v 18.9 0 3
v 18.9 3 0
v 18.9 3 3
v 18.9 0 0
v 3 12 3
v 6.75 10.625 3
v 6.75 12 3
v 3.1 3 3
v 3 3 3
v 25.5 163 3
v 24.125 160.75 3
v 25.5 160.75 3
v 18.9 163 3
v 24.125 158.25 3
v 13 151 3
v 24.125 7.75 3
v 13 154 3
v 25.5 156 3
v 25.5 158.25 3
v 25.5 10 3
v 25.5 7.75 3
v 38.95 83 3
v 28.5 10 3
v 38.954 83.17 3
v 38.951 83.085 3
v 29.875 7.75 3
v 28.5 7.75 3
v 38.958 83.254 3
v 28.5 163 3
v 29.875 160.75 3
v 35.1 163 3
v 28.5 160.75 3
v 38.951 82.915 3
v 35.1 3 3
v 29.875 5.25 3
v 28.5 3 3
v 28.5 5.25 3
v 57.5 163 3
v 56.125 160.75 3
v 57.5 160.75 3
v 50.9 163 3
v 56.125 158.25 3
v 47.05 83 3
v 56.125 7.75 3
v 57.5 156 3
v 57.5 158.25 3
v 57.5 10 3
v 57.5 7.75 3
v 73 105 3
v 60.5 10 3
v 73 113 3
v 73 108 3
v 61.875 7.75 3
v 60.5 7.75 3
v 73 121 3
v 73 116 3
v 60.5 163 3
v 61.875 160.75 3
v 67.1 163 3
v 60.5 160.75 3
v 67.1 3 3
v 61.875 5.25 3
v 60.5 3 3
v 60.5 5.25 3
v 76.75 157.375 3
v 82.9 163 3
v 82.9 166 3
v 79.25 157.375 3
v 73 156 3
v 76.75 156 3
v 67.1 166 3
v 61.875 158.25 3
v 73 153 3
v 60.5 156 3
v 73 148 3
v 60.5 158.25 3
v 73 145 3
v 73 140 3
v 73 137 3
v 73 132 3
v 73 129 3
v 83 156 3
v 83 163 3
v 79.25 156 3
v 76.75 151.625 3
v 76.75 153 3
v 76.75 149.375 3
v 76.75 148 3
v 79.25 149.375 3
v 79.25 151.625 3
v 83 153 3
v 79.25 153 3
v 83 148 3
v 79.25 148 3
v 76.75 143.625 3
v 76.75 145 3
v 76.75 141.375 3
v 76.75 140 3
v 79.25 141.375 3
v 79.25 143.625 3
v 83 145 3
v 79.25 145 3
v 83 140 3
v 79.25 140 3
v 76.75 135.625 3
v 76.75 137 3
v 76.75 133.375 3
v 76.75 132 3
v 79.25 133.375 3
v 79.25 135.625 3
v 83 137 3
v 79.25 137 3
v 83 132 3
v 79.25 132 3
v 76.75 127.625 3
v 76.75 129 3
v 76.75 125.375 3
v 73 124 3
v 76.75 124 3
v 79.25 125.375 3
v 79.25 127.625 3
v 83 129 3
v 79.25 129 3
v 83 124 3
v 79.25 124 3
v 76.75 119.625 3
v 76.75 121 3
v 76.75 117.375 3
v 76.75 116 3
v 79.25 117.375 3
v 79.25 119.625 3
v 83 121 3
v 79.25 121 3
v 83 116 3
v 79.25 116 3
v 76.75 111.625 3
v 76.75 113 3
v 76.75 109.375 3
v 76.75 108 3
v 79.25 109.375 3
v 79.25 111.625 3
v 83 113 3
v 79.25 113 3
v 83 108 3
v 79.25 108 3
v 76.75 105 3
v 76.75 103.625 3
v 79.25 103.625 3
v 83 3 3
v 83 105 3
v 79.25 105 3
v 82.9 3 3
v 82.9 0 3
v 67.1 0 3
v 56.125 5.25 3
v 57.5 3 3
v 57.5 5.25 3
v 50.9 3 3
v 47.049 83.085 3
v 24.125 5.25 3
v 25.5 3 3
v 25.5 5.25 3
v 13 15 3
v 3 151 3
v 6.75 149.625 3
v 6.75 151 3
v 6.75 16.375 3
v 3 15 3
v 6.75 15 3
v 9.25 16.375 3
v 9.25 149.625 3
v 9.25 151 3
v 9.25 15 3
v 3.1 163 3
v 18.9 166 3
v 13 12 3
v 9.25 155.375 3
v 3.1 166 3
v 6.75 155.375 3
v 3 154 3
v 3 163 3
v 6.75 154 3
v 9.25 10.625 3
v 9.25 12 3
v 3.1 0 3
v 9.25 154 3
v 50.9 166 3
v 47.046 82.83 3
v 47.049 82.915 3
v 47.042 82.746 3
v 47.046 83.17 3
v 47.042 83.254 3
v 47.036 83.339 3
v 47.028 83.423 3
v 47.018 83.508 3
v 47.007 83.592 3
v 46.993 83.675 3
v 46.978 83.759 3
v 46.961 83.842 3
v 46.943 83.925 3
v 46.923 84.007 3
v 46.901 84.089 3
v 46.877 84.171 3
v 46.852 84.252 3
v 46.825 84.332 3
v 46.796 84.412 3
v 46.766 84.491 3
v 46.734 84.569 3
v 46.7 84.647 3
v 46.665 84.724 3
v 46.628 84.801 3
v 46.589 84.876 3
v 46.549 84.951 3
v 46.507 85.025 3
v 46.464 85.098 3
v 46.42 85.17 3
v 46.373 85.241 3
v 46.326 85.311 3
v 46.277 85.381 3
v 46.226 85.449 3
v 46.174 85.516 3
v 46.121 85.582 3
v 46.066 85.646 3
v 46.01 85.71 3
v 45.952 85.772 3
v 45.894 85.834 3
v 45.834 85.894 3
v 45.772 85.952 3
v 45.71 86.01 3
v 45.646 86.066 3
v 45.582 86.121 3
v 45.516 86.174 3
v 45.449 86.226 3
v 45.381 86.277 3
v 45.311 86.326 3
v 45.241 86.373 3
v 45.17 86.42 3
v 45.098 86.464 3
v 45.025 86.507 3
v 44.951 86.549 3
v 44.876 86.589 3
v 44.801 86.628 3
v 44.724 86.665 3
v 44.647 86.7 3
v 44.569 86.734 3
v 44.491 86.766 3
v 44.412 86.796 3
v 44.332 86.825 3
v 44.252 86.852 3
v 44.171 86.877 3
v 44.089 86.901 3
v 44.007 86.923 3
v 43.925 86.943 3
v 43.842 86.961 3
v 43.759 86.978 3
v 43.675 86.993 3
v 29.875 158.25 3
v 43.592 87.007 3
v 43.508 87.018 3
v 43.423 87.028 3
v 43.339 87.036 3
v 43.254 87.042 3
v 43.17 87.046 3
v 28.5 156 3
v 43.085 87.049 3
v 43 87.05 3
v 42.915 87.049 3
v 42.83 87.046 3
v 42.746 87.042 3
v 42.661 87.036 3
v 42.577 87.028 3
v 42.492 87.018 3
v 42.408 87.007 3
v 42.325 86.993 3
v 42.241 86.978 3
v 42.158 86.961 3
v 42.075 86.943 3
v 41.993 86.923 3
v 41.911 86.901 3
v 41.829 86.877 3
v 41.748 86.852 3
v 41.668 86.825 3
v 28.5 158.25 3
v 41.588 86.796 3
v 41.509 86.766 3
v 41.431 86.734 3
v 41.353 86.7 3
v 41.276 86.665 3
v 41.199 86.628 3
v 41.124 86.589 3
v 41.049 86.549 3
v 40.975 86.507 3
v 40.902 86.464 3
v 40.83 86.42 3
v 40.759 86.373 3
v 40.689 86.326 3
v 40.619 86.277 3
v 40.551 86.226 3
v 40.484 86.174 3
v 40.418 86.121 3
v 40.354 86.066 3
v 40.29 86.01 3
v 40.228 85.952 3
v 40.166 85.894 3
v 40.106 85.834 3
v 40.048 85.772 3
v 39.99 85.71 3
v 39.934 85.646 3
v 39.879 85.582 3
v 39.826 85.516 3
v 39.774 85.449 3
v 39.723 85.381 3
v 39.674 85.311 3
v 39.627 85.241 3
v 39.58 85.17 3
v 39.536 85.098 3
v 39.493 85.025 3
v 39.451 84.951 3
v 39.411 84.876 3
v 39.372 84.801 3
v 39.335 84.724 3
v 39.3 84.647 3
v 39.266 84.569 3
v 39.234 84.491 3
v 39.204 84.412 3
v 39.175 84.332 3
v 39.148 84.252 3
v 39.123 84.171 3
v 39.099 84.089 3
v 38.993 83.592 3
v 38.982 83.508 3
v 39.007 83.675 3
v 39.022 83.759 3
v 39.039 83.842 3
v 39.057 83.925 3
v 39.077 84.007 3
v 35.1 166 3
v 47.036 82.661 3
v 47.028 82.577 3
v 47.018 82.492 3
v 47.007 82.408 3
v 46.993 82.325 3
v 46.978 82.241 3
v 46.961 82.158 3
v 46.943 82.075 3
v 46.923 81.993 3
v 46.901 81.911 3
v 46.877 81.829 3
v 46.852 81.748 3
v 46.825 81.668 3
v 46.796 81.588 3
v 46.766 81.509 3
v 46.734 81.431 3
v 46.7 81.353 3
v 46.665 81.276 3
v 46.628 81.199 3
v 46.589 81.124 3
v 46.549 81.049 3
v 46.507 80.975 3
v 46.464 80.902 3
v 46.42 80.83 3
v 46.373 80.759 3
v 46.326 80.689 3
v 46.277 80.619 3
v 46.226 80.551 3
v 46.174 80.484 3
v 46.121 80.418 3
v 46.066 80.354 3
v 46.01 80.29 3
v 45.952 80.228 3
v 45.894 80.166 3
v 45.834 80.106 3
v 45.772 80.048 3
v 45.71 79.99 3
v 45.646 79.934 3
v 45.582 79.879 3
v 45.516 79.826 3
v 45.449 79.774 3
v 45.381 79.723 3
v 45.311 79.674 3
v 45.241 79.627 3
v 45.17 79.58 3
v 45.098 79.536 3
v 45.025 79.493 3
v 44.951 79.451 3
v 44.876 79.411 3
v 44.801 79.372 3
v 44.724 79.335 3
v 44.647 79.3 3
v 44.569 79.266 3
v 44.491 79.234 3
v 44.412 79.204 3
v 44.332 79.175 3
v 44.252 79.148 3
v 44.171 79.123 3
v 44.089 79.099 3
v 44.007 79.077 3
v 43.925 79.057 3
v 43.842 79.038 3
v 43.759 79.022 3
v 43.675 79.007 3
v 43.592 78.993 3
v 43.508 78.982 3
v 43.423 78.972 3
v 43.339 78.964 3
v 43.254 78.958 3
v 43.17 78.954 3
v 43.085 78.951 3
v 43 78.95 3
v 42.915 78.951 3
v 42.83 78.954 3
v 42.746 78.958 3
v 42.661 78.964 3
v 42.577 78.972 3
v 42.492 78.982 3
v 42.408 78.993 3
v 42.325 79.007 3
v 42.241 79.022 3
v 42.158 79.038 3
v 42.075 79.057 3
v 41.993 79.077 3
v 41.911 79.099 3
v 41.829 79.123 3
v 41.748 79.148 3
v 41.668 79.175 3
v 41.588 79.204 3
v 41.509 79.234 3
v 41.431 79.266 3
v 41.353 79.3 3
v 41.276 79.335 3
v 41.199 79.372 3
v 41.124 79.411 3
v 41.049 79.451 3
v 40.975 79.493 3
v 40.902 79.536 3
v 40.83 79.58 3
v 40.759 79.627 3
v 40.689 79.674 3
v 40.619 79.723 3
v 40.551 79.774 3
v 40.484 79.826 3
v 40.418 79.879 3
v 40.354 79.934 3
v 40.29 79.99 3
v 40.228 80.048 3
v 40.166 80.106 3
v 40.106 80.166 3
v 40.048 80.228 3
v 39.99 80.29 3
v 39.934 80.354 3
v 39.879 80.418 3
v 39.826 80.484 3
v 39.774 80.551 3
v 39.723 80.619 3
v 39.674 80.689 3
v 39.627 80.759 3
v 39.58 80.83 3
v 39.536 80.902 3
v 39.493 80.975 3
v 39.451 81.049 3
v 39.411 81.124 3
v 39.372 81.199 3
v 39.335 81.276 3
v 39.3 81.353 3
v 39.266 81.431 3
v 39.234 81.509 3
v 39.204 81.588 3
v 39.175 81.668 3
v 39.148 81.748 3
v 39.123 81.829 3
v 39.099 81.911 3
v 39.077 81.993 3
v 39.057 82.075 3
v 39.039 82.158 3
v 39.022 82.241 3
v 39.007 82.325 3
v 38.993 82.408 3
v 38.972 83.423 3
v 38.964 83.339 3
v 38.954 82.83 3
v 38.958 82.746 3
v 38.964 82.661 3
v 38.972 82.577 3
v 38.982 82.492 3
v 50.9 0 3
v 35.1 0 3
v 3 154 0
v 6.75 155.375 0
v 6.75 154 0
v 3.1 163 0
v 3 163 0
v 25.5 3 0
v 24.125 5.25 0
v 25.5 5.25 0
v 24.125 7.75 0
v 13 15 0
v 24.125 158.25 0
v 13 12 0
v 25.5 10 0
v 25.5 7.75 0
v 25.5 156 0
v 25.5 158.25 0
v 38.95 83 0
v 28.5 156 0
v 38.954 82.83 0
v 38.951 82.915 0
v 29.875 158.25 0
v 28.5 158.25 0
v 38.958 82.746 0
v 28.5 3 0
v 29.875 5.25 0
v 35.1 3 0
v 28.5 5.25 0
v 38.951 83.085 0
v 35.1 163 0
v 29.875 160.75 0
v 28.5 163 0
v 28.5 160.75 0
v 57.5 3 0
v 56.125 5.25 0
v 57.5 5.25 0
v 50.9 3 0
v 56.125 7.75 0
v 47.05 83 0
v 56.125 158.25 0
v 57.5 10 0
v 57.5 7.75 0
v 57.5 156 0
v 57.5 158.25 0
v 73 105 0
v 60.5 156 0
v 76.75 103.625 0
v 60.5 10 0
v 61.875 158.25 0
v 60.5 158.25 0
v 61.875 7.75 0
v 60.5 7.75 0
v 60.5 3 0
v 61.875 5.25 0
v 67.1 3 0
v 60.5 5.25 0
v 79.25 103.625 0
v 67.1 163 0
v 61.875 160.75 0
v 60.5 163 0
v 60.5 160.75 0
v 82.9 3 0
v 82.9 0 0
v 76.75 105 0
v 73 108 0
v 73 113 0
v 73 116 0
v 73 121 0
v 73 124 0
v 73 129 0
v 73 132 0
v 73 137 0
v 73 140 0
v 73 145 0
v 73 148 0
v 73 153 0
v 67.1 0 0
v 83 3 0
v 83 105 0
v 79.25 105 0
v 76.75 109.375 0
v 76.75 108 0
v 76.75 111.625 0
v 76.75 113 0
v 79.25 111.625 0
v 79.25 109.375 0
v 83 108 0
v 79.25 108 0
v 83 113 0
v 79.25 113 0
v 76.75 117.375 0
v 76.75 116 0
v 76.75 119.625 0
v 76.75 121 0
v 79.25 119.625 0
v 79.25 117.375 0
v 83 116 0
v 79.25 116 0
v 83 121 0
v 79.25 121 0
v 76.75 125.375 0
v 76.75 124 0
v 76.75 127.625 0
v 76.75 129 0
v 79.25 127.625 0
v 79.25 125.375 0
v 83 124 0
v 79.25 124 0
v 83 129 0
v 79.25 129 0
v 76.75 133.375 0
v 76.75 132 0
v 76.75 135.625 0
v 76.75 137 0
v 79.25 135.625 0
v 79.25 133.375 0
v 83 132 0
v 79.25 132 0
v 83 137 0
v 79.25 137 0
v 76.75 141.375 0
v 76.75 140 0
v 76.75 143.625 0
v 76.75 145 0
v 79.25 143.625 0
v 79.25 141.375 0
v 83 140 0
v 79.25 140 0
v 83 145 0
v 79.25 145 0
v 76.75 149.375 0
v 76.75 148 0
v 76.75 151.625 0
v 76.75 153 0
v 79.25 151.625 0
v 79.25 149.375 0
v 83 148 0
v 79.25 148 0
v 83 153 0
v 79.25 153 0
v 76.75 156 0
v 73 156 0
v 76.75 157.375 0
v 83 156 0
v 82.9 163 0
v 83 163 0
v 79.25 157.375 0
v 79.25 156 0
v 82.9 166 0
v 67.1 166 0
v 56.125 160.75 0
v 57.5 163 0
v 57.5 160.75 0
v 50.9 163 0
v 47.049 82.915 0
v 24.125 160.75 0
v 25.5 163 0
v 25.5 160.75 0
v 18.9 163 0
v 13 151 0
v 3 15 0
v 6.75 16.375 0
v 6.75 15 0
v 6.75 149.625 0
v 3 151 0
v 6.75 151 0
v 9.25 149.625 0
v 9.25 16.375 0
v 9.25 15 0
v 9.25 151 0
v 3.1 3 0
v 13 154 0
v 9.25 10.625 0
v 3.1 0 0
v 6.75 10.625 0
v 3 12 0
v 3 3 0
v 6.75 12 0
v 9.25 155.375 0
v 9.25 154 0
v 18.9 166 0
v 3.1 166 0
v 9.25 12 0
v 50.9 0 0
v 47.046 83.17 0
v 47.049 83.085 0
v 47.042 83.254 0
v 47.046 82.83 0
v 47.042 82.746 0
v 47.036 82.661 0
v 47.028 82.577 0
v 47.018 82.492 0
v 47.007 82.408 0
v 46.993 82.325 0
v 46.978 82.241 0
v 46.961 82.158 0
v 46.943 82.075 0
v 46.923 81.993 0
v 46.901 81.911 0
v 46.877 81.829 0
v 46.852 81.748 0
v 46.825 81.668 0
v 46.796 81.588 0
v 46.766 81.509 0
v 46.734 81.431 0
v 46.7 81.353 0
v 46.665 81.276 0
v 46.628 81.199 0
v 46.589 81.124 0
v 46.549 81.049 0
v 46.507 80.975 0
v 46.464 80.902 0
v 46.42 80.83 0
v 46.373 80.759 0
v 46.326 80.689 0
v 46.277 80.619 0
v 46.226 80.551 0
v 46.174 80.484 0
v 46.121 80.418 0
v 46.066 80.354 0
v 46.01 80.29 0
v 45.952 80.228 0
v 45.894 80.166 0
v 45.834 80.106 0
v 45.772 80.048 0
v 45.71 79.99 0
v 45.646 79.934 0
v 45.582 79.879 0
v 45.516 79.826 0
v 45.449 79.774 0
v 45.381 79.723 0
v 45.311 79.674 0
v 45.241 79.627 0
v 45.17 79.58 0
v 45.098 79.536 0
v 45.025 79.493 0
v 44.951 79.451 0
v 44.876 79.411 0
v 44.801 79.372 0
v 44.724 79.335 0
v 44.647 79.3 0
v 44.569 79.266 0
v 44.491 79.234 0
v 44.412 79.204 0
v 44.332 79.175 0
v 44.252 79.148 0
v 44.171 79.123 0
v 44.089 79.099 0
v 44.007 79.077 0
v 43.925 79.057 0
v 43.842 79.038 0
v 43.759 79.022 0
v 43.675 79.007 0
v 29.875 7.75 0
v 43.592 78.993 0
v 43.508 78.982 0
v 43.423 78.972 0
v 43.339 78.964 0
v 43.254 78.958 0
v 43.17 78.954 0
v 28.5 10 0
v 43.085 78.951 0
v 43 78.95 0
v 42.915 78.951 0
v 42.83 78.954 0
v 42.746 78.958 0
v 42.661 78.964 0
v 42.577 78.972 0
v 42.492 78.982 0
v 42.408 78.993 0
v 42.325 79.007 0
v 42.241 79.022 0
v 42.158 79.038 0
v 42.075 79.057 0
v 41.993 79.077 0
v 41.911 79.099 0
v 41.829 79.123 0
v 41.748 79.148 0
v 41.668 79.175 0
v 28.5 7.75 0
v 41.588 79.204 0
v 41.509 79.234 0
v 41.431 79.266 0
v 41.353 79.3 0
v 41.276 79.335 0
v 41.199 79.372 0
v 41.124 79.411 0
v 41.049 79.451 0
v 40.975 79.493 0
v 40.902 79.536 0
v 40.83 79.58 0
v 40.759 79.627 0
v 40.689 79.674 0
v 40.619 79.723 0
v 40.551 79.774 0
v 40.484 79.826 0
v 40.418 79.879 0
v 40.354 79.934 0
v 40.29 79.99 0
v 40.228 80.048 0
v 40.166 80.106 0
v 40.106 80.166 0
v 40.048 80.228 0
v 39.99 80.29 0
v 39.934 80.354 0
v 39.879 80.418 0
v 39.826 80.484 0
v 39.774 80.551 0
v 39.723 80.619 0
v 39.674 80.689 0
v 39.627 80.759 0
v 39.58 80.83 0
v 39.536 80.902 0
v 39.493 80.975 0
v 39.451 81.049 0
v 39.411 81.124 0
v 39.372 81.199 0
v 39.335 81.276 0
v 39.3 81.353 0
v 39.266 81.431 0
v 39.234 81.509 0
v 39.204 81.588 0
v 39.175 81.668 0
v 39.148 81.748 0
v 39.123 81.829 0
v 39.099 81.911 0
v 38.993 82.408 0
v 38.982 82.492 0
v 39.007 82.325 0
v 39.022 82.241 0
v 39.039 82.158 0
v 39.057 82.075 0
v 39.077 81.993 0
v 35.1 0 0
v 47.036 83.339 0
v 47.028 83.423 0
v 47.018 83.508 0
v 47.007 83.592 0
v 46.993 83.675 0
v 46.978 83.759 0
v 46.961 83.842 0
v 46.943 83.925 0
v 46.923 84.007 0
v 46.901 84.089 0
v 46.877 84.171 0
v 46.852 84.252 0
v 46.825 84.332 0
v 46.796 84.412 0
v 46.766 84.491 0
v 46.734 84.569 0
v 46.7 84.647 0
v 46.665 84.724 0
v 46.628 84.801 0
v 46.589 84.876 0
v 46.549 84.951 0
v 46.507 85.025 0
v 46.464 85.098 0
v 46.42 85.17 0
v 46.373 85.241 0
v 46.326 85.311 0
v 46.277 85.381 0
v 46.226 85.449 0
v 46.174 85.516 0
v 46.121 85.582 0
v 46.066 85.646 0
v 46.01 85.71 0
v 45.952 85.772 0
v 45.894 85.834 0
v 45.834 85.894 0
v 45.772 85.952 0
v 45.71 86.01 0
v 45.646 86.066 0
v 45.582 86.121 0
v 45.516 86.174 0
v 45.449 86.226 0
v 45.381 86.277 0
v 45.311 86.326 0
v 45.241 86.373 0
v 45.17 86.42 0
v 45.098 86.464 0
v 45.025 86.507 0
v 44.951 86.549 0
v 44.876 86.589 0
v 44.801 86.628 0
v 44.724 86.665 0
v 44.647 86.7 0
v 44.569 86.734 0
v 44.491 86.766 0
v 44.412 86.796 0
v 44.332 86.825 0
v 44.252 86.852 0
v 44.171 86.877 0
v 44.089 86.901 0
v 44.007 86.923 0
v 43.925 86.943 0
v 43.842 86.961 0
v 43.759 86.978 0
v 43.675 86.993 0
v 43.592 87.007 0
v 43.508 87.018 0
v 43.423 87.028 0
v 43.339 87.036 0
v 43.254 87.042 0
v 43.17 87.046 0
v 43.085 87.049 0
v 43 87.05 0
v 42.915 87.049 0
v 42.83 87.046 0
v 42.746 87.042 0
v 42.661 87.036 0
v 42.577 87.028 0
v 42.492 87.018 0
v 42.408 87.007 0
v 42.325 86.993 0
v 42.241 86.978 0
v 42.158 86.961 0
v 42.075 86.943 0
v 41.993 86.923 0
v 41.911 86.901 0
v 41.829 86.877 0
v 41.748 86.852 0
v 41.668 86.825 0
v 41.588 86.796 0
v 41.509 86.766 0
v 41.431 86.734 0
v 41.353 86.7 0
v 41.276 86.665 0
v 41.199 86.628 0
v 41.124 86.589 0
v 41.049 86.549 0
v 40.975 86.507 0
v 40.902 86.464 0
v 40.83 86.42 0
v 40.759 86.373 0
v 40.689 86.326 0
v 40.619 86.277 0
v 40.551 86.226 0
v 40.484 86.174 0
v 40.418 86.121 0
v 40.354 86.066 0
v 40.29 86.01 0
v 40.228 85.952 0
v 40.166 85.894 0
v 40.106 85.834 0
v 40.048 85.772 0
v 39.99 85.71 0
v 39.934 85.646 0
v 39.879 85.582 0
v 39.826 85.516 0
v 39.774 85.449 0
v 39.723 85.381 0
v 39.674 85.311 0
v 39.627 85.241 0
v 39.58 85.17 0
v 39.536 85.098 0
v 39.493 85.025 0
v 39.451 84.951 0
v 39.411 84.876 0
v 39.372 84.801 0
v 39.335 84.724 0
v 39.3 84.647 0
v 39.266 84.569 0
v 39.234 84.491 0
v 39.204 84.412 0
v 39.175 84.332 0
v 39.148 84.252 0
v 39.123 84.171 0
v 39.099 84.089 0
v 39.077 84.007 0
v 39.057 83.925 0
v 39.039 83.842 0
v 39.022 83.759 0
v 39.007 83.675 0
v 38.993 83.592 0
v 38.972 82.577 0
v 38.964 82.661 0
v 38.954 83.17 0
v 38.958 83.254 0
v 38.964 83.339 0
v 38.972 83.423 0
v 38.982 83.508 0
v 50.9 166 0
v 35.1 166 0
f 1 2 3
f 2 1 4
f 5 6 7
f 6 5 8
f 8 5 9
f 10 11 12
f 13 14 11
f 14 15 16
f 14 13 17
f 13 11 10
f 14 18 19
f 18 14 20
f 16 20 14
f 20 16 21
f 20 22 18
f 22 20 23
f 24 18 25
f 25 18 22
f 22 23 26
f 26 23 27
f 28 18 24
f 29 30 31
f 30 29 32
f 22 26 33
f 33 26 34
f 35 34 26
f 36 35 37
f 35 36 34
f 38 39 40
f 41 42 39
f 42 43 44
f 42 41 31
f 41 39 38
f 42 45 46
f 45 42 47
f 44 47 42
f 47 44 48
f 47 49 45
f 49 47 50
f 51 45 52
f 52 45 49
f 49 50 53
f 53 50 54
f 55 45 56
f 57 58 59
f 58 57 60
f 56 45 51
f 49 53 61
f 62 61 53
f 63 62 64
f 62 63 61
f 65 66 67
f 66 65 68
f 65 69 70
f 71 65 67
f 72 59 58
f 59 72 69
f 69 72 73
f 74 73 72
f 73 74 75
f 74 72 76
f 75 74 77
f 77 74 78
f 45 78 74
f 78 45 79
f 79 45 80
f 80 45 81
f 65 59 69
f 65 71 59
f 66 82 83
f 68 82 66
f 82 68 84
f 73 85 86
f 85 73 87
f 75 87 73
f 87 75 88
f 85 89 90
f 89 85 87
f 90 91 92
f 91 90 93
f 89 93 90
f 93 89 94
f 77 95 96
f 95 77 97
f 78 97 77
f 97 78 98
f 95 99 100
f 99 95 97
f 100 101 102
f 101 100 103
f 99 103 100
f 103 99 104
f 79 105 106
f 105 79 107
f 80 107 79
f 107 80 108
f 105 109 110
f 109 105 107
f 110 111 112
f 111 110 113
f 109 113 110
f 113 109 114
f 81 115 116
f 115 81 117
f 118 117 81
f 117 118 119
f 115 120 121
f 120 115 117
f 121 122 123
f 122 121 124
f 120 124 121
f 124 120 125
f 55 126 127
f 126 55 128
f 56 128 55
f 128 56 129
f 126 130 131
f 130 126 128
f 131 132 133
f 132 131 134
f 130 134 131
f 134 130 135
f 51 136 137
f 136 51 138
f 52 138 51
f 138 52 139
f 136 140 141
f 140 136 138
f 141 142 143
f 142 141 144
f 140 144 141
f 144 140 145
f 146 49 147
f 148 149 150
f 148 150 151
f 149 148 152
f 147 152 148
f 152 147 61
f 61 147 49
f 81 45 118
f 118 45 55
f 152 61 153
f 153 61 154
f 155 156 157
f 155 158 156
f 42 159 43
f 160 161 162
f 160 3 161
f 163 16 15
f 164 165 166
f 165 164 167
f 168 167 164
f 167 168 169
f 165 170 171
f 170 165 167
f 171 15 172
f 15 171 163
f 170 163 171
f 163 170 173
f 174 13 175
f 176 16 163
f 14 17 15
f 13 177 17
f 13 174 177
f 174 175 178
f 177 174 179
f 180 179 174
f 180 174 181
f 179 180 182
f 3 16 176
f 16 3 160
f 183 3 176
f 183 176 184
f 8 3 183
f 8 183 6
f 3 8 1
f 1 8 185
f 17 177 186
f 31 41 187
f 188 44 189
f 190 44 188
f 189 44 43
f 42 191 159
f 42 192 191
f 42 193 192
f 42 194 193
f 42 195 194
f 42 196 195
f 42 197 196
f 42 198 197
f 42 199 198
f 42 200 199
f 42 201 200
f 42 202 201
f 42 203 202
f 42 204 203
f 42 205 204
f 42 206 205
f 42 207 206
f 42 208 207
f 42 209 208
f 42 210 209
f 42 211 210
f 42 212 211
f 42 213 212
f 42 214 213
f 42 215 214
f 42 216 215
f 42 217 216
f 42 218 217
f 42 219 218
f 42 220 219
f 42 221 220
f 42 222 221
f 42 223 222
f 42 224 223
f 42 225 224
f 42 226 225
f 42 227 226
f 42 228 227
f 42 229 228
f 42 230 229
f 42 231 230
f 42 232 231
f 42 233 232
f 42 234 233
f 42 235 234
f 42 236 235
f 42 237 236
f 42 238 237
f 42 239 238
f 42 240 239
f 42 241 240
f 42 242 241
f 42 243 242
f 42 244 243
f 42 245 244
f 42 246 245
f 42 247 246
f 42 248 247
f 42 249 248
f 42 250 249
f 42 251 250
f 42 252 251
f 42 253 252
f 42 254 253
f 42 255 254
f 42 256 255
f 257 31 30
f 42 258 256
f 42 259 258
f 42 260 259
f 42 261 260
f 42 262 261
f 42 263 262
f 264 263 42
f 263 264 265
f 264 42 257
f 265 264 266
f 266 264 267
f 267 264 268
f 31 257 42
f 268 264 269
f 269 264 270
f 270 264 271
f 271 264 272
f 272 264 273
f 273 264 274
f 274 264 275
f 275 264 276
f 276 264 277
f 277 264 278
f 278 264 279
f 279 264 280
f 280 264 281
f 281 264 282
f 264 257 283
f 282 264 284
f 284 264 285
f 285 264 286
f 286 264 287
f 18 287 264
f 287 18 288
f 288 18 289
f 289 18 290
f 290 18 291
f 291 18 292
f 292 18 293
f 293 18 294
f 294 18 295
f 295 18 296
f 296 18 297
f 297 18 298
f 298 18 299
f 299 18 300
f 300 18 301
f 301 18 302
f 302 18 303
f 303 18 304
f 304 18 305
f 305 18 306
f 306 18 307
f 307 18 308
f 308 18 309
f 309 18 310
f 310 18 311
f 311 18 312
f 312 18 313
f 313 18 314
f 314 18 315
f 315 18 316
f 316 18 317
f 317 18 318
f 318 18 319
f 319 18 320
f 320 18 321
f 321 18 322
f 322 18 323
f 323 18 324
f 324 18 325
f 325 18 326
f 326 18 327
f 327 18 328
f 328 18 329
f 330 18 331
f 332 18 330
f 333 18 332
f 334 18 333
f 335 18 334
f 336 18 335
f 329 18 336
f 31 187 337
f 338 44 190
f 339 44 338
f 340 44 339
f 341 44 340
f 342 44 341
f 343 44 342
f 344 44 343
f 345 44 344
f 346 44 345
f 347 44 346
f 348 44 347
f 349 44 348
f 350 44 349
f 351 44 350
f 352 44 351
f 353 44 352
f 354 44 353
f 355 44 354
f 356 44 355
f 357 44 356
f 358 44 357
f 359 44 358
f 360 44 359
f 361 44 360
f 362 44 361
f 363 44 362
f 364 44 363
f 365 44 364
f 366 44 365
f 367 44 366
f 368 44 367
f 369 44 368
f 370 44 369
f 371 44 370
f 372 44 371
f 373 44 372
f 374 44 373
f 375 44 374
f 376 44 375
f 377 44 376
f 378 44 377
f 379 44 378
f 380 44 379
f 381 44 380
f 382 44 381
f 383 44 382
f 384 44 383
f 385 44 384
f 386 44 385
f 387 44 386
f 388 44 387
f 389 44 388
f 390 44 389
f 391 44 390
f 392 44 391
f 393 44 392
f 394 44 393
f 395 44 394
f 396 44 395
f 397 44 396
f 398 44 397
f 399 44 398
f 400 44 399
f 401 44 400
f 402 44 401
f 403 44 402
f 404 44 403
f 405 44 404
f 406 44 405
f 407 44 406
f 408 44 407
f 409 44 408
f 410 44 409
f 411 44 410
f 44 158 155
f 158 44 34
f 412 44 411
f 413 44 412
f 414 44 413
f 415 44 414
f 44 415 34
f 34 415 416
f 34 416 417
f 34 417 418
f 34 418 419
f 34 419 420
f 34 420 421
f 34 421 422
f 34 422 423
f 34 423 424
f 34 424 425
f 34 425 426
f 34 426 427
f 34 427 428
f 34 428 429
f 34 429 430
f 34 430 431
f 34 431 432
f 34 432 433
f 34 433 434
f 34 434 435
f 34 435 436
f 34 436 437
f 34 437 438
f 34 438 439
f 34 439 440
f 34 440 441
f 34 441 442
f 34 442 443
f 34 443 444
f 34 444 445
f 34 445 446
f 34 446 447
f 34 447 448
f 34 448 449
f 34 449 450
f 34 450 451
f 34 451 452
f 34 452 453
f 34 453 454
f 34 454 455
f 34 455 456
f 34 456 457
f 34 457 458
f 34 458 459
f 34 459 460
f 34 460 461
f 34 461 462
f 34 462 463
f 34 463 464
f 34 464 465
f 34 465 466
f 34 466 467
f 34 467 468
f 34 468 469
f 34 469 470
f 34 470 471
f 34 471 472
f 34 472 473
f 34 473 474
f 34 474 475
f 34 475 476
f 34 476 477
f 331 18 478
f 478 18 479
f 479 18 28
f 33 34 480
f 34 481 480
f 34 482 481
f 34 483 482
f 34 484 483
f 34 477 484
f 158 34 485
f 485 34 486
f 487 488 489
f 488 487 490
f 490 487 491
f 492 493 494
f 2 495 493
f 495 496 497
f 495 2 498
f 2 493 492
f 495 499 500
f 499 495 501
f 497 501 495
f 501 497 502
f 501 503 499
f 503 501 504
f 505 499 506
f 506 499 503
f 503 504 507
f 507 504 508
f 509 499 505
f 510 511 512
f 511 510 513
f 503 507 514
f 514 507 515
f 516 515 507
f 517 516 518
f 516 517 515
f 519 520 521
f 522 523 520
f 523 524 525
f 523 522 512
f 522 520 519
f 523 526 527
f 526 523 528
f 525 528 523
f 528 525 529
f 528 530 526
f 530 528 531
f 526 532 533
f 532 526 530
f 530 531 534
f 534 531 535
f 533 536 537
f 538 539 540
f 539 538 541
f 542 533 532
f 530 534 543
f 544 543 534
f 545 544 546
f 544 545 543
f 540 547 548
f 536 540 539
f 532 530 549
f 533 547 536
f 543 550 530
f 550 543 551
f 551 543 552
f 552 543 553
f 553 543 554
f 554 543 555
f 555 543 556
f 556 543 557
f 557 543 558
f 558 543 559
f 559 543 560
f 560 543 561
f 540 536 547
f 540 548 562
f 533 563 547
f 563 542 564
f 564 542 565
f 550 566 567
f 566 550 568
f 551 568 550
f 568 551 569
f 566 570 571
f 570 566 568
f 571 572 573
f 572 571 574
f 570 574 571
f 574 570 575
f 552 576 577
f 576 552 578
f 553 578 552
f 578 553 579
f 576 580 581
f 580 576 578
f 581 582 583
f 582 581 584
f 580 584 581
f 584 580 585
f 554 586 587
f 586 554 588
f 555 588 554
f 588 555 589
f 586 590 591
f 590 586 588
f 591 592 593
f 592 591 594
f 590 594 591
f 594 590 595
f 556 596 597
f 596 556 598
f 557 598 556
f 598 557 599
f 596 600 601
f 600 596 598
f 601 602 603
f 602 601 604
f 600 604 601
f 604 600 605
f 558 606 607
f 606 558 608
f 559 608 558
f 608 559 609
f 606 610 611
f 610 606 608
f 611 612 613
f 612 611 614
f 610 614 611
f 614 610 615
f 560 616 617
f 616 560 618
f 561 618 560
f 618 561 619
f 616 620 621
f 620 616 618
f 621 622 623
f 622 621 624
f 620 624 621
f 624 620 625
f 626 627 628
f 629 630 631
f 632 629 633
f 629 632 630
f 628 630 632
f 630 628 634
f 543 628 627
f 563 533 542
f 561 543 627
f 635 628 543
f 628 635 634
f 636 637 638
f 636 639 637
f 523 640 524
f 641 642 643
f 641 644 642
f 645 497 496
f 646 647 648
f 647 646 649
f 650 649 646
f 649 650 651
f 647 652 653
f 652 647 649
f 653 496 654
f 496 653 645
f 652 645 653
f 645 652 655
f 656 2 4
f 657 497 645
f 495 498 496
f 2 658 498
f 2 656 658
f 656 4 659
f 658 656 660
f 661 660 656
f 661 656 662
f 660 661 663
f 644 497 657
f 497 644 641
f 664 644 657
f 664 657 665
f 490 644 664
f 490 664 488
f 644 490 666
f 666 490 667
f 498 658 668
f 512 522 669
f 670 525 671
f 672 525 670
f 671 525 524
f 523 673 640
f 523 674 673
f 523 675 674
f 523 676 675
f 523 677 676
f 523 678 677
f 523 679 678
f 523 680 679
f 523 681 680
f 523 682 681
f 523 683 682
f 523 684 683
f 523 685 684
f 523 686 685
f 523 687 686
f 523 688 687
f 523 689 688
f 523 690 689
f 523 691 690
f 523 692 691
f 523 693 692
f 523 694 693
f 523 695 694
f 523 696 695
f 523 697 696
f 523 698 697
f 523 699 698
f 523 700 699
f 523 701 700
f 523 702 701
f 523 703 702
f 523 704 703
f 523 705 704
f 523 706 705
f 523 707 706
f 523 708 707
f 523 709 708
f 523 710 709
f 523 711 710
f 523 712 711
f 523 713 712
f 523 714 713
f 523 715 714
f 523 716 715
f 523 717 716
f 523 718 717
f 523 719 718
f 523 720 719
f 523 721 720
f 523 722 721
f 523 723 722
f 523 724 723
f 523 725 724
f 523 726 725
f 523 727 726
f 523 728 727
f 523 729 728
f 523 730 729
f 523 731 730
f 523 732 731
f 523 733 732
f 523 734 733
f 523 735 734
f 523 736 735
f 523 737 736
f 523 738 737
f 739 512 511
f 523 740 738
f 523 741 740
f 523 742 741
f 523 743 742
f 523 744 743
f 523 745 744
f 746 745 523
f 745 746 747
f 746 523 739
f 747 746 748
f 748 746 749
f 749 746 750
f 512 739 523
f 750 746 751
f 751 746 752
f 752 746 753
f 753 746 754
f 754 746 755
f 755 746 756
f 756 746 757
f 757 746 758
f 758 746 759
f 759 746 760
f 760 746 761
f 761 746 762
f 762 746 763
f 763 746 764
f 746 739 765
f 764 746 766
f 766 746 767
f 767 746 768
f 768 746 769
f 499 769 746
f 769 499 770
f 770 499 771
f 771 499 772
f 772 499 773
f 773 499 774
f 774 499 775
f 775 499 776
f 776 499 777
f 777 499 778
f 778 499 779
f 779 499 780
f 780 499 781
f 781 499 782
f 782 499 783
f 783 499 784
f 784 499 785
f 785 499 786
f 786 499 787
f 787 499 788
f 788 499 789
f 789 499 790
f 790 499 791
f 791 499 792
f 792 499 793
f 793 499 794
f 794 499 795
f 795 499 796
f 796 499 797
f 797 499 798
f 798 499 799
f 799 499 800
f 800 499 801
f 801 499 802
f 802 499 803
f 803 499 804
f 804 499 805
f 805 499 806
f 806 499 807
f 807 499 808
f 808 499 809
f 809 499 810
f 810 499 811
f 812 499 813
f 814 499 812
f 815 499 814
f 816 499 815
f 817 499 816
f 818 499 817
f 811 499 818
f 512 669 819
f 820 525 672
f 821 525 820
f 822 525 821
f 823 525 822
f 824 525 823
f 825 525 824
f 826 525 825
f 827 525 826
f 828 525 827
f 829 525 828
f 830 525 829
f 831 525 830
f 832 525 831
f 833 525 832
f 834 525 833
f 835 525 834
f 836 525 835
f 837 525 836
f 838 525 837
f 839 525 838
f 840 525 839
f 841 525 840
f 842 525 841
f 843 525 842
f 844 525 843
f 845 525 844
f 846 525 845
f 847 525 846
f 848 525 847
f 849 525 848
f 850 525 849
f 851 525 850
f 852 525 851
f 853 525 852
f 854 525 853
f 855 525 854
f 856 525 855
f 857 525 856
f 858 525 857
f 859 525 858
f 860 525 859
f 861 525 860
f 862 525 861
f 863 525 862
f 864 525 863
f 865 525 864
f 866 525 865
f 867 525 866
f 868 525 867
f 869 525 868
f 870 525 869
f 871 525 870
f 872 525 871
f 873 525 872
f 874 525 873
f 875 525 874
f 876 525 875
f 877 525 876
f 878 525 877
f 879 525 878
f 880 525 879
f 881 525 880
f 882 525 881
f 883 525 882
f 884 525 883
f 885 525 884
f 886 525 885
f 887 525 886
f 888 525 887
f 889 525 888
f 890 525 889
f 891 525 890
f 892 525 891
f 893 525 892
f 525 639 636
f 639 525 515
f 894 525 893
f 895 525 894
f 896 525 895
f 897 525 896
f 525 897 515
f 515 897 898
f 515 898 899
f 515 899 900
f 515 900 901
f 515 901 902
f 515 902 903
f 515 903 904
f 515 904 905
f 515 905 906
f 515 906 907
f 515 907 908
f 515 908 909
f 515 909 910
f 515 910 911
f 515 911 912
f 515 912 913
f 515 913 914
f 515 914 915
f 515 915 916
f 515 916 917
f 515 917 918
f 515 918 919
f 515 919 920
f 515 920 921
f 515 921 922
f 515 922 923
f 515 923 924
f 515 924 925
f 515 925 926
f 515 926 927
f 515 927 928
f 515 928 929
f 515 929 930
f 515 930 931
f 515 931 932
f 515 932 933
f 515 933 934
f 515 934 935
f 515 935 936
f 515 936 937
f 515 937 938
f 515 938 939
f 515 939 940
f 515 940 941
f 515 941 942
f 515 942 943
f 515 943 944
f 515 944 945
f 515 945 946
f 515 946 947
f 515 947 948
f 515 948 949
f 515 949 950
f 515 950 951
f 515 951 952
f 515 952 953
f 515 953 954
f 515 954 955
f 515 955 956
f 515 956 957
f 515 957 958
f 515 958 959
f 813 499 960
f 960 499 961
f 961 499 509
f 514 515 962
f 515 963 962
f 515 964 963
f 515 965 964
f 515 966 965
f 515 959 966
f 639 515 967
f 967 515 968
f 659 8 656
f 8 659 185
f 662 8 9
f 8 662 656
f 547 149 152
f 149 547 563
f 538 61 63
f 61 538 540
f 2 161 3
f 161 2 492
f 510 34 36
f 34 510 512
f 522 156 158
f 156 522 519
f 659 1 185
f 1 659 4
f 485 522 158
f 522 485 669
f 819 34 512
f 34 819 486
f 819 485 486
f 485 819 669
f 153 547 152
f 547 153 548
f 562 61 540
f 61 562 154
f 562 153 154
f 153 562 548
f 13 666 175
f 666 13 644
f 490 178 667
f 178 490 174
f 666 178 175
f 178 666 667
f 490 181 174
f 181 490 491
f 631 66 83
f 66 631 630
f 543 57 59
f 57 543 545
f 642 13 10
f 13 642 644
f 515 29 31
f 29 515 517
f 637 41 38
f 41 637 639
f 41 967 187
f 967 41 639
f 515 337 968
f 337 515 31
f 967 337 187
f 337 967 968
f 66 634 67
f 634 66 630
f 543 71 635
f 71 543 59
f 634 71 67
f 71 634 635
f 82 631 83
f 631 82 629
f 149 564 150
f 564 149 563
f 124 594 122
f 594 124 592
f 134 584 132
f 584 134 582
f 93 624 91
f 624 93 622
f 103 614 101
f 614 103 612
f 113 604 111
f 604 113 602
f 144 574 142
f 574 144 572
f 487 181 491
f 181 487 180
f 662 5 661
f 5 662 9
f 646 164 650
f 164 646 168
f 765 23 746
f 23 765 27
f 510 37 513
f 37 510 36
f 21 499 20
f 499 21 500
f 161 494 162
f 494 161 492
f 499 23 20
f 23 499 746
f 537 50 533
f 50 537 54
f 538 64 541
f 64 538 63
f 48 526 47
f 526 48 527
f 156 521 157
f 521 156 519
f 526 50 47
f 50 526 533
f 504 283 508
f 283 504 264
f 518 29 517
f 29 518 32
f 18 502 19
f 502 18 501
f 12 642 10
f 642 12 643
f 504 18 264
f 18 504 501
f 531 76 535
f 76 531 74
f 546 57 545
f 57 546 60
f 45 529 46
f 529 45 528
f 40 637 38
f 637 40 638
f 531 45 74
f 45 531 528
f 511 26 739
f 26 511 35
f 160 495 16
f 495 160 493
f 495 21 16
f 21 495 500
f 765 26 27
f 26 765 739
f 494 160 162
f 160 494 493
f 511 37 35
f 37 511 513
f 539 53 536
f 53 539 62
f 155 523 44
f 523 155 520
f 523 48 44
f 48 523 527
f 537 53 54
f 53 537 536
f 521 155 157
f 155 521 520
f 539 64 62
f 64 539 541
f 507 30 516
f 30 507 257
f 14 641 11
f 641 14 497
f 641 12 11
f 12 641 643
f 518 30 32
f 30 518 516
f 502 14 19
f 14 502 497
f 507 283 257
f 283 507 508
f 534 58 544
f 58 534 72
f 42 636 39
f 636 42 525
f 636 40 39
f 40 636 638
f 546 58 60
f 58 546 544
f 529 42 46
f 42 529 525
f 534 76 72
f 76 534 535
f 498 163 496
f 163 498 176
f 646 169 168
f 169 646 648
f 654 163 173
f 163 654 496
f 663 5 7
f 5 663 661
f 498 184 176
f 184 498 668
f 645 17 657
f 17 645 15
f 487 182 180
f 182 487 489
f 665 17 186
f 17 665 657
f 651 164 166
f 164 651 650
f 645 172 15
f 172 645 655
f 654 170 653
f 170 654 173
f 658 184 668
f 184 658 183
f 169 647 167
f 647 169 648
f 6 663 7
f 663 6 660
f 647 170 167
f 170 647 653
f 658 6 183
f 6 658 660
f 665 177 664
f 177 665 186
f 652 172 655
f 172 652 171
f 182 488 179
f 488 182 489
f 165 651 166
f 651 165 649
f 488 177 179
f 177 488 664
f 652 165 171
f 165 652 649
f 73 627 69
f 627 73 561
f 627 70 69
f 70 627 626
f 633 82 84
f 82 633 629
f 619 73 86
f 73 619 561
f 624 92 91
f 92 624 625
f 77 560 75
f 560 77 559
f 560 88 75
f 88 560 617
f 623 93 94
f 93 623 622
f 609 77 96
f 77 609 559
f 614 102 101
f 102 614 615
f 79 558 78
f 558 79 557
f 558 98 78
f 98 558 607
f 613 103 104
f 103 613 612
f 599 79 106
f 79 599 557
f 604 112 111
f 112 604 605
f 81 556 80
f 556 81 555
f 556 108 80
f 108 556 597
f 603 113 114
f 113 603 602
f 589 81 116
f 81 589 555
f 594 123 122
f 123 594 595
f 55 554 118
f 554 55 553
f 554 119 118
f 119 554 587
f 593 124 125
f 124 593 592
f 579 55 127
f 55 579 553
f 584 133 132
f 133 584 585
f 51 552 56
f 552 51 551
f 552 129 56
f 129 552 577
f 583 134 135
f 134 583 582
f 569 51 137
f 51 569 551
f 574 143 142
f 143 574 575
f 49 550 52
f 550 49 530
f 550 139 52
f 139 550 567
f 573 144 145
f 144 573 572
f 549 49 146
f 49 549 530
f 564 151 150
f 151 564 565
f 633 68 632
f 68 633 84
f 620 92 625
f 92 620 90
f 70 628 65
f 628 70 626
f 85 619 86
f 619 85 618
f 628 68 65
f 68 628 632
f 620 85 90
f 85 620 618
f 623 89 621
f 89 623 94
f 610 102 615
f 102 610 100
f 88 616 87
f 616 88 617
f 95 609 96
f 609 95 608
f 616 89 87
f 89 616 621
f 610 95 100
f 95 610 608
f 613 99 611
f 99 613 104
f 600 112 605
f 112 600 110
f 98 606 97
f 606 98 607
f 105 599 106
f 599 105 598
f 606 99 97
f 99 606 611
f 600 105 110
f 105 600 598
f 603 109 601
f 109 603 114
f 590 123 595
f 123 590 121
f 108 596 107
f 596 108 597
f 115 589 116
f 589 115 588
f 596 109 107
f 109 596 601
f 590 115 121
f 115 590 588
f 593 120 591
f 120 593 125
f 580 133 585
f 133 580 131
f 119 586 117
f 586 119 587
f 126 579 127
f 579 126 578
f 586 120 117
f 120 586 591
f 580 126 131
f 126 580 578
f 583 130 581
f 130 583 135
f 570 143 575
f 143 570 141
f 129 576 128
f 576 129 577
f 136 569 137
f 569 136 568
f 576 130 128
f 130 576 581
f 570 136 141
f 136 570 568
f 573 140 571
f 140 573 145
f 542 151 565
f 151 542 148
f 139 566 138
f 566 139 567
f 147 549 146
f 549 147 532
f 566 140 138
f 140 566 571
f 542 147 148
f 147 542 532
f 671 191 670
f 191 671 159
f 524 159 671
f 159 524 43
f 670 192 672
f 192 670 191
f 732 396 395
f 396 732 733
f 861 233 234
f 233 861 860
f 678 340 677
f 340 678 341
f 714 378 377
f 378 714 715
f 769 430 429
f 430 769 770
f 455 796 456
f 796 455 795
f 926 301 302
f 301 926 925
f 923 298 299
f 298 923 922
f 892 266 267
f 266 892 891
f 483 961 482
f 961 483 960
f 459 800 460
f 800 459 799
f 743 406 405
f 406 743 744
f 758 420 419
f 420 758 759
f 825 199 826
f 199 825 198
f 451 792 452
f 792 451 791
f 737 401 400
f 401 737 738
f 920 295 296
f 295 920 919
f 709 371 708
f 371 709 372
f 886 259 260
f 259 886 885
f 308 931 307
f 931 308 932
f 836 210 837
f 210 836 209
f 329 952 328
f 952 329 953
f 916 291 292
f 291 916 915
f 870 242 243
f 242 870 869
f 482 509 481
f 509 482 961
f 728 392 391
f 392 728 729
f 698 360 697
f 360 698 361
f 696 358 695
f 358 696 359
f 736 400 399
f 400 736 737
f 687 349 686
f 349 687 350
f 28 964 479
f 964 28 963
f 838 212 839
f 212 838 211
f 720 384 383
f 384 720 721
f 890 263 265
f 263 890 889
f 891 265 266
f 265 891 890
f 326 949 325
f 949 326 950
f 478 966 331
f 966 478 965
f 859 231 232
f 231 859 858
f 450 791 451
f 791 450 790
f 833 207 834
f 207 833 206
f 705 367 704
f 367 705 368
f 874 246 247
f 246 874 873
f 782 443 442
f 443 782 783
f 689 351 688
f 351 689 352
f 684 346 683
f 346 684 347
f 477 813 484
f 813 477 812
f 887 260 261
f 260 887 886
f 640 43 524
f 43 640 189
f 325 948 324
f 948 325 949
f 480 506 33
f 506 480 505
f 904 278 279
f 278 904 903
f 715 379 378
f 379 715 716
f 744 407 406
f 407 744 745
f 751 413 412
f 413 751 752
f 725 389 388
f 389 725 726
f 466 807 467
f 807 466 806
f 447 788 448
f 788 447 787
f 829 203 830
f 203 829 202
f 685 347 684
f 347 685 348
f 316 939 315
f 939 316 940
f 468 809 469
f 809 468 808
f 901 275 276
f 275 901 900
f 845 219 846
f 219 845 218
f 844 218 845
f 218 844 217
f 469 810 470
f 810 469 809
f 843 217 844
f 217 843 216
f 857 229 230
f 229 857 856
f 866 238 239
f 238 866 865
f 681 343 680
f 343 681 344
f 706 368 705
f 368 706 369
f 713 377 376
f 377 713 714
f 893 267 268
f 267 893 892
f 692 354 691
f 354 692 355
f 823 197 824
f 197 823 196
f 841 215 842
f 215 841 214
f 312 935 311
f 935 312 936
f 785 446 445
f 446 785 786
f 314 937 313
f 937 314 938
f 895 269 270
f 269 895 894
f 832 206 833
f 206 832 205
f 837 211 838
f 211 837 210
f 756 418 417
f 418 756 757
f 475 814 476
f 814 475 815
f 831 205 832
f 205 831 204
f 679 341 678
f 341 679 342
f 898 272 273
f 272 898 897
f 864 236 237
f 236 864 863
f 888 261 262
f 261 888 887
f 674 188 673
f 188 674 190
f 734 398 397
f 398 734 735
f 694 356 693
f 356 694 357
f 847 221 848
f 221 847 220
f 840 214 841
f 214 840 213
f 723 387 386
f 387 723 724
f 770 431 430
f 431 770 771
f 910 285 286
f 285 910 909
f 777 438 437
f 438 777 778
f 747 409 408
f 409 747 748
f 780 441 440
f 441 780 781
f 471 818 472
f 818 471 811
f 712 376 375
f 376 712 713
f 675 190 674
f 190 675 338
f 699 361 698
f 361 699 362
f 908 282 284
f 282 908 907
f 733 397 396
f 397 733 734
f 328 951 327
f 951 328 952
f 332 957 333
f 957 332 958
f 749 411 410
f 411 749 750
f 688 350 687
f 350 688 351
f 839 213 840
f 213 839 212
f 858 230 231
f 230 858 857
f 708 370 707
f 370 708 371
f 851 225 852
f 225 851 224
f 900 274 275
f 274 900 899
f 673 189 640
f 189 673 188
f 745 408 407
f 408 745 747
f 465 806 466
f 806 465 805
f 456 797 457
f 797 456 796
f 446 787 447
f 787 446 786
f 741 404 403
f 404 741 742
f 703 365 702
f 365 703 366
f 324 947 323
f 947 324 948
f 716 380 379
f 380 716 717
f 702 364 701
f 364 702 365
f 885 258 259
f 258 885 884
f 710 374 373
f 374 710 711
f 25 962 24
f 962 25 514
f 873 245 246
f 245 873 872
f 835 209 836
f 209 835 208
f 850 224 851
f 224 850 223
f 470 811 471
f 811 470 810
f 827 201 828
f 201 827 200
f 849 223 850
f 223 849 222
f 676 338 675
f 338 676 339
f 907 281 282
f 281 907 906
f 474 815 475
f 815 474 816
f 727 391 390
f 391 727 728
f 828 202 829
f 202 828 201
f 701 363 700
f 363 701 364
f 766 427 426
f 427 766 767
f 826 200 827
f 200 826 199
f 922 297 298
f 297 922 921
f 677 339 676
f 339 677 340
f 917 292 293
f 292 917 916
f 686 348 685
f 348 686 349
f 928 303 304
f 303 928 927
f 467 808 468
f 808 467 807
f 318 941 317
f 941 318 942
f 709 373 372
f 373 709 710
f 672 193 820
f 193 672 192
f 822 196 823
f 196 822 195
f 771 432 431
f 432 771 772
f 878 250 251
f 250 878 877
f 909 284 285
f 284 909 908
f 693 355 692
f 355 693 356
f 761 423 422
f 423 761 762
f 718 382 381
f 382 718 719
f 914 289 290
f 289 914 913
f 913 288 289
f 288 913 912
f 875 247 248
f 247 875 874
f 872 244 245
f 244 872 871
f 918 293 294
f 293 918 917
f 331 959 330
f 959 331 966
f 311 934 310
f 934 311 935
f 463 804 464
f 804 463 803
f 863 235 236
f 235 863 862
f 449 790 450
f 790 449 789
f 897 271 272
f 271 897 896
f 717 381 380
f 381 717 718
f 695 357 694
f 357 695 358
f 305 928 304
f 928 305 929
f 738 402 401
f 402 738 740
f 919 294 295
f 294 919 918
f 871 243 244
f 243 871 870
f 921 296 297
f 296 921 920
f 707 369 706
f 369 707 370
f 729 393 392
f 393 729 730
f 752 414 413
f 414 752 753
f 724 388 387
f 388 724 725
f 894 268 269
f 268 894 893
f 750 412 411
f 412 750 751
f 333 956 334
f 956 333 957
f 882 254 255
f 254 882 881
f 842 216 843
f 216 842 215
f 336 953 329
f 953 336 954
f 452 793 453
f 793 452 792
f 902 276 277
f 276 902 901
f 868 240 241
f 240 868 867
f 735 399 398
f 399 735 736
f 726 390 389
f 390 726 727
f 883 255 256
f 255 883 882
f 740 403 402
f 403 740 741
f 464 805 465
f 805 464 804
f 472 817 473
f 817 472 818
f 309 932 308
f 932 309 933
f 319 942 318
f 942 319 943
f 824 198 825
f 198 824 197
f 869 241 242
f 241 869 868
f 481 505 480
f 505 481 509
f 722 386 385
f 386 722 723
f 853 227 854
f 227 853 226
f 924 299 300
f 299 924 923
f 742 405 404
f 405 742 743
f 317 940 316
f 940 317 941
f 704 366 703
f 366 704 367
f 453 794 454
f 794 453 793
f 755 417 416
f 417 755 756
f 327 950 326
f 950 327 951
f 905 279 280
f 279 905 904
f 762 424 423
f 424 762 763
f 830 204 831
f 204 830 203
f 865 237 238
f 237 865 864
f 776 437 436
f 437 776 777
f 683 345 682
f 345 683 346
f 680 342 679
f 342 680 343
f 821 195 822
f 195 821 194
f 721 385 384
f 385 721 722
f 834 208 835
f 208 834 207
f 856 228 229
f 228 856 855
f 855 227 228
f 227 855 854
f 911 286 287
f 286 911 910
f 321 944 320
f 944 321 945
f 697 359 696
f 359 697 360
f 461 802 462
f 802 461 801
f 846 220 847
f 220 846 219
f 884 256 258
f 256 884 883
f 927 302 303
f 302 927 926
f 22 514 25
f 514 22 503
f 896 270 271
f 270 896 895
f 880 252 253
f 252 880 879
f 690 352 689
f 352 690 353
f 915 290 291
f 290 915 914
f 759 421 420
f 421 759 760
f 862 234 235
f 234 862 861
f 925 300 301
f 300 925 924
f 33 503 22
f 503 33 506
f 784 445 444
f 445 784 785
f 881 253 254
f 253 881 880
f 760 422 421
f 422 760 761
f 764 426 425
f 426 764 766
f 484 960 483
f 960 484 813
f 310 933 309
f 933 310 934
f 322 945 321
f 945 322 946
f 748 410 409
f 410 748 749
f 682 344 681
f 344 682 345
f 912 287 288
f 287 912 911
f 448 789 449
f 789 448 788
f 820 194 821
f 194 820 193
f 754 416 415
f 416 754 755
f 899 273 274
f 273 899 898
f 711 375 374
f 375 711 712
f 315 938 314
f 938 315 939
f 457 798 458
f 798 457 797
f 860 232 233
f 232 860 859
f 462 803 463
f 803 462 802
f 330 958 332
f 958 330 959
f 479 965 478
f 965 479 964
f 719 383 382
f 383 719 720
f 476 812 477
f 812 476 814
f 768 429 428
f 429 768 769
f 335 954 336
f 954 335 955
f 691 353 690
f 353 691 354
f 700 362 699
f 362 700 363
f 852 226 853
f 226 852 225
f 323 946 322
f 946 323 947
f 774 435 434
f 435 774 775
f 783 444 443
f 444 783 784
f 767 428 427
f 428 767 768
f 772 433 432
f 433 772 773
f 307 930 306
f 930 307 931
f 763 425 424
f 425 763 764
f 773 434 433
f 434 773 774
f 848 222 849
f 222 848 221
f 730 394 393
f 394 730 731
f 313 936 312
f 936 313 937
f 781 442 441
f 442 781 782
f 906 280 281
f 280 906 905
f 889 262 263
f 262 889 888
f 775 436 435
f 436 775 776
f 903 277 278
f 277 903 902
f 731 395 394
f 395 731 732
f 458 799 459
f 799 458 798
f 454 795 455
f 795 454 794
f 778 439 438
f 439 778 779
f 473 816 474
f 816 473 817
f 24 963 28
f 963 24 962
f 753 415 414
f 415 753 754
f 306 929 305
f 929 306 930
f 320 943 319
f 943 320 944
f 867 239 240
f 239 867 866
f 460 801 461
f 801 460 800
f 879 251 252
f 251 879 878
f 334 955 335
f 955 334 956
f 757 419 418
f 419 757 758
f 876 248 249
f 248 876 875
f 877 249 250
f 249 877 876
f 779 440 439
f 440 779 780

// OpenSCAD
lct = 3; // Laser Cut thickness
dim_x = 86;
dim_y =  166;
t_length = 10;// length of t-slot screw
t_thick = 3;// diameter of t-slot screw
nut_dia = 5.75;// diameter of t-slot nut
nut_thick = 2.5;// thickness of t-slot nut
dia_c = 8.1; //diameter of center hole
rad_c = dia_c/2;

tol = .1; //teeth tolerance
bthp = 12;//back t hole position (here back is leftside)
fthp = 10;//fromt t hole position (here front is right side)
fth_sep =8; //front t hole separation

difference(){
union(){
translate([lct,lct,0])cube([dim_x-2*lct,dim_y-2*lct,lct]);//cuboid
for(x=[lct+tol:32:dim_x-2*lct])translate([x,0,0])cube([16-2*tol,lct,lct]);//teeth bottom
for(x=[lct+tol:32:dim_x-2*lct])translate([x,dim_y-lct,0])cube([16-2*tol,lct,lct]);//teeth top
}

union(){
for(x=[lct+16+((16-t_thick)/2),32 + lct+16+((16-t_thick)/2)])/*x  and 32+x*/translate([x,0,0])color("red")cube([t_thick,t_length,lct]);//screw hole bottom
for(x=[lct+16+((16-t_thick)/2), 32 + lct+16+((16-t_thick)/2)])translate([x,dim_y-t_length,0])color("red")cube([t_thick,t_length,lct]);//screw hole top
    
for(x=[(lct+16+((16-t_thick)/2))/*dist bw O and screwhole*/-((nut_dia-t_thick)/2)/*dist diff screwhole & nuthole*/:32:dim_x])translate([x,lct+(t_length-lct-nut_thick)/2,0])cube([nut_dia,nut_thick,lct]);//nut hole bottom
for(x=[(lct+16+((16-t_thick)/2))/*dist bw O and screwhole*/-((nut_dia-t_thick)/2)/*dist diff screwhole & nuthole*/:32:dim_x])translate([x,dim_y-lct-((t_length-lct-nut_thick)/2)-nut_thick,0])cube([nut_dia,nut_thick,lct]);//nut hole top
}

union(){
    for(y=[bthp,dim_y-bthp-t_thick])translate([lct/*lct added, change to 0 if required,tscrew will look small*/,y,0])cube([t_length,t_thick,lct]);//screwhole left side(back)
    for(y=[bthp-((nut_dia-t_thick)/2),dim_y-bthp-((nut_dia-t_thick)/2)-t_thick])translate([lct+((t_length-nut_thick)/2),y,0])cube([nut_thick,nut_dia,lct]);//nuthole left side(back)
    
    
    for(y=[dim_y-fthp-t_thick:-fth_sep:100])translate([dim_x-t_length-lct/*lct added*/,y,0])cube([t_length,t_thick,lct]);//screwhole right side(front)
    for(y=[dim_y-fthp-((nut_dia-t_thick)/2)-t_thick:-fth_sep:100])translate([dim_x-lct-((t_length-nut_thick)/2)-nut_thick,y,0])cube([nut_thick,nut_dia,lct]);//nuthole right side(front)
}

union(){//center hole
translate([dim_x/2,dim_y/2,0])cylinder(lct,r1=rad_c,r2=rad_c,center=false,$fn=300);
}
//union(){//back cut hole for back part
//for(y=[bthp+(t_thick/2)-(10/2),dim_y-bthp-(t_thick/2)+//(10/2)])translate([0,y,0]cube([lct+lct,10/*front //part width*/,3]);


//}
}
